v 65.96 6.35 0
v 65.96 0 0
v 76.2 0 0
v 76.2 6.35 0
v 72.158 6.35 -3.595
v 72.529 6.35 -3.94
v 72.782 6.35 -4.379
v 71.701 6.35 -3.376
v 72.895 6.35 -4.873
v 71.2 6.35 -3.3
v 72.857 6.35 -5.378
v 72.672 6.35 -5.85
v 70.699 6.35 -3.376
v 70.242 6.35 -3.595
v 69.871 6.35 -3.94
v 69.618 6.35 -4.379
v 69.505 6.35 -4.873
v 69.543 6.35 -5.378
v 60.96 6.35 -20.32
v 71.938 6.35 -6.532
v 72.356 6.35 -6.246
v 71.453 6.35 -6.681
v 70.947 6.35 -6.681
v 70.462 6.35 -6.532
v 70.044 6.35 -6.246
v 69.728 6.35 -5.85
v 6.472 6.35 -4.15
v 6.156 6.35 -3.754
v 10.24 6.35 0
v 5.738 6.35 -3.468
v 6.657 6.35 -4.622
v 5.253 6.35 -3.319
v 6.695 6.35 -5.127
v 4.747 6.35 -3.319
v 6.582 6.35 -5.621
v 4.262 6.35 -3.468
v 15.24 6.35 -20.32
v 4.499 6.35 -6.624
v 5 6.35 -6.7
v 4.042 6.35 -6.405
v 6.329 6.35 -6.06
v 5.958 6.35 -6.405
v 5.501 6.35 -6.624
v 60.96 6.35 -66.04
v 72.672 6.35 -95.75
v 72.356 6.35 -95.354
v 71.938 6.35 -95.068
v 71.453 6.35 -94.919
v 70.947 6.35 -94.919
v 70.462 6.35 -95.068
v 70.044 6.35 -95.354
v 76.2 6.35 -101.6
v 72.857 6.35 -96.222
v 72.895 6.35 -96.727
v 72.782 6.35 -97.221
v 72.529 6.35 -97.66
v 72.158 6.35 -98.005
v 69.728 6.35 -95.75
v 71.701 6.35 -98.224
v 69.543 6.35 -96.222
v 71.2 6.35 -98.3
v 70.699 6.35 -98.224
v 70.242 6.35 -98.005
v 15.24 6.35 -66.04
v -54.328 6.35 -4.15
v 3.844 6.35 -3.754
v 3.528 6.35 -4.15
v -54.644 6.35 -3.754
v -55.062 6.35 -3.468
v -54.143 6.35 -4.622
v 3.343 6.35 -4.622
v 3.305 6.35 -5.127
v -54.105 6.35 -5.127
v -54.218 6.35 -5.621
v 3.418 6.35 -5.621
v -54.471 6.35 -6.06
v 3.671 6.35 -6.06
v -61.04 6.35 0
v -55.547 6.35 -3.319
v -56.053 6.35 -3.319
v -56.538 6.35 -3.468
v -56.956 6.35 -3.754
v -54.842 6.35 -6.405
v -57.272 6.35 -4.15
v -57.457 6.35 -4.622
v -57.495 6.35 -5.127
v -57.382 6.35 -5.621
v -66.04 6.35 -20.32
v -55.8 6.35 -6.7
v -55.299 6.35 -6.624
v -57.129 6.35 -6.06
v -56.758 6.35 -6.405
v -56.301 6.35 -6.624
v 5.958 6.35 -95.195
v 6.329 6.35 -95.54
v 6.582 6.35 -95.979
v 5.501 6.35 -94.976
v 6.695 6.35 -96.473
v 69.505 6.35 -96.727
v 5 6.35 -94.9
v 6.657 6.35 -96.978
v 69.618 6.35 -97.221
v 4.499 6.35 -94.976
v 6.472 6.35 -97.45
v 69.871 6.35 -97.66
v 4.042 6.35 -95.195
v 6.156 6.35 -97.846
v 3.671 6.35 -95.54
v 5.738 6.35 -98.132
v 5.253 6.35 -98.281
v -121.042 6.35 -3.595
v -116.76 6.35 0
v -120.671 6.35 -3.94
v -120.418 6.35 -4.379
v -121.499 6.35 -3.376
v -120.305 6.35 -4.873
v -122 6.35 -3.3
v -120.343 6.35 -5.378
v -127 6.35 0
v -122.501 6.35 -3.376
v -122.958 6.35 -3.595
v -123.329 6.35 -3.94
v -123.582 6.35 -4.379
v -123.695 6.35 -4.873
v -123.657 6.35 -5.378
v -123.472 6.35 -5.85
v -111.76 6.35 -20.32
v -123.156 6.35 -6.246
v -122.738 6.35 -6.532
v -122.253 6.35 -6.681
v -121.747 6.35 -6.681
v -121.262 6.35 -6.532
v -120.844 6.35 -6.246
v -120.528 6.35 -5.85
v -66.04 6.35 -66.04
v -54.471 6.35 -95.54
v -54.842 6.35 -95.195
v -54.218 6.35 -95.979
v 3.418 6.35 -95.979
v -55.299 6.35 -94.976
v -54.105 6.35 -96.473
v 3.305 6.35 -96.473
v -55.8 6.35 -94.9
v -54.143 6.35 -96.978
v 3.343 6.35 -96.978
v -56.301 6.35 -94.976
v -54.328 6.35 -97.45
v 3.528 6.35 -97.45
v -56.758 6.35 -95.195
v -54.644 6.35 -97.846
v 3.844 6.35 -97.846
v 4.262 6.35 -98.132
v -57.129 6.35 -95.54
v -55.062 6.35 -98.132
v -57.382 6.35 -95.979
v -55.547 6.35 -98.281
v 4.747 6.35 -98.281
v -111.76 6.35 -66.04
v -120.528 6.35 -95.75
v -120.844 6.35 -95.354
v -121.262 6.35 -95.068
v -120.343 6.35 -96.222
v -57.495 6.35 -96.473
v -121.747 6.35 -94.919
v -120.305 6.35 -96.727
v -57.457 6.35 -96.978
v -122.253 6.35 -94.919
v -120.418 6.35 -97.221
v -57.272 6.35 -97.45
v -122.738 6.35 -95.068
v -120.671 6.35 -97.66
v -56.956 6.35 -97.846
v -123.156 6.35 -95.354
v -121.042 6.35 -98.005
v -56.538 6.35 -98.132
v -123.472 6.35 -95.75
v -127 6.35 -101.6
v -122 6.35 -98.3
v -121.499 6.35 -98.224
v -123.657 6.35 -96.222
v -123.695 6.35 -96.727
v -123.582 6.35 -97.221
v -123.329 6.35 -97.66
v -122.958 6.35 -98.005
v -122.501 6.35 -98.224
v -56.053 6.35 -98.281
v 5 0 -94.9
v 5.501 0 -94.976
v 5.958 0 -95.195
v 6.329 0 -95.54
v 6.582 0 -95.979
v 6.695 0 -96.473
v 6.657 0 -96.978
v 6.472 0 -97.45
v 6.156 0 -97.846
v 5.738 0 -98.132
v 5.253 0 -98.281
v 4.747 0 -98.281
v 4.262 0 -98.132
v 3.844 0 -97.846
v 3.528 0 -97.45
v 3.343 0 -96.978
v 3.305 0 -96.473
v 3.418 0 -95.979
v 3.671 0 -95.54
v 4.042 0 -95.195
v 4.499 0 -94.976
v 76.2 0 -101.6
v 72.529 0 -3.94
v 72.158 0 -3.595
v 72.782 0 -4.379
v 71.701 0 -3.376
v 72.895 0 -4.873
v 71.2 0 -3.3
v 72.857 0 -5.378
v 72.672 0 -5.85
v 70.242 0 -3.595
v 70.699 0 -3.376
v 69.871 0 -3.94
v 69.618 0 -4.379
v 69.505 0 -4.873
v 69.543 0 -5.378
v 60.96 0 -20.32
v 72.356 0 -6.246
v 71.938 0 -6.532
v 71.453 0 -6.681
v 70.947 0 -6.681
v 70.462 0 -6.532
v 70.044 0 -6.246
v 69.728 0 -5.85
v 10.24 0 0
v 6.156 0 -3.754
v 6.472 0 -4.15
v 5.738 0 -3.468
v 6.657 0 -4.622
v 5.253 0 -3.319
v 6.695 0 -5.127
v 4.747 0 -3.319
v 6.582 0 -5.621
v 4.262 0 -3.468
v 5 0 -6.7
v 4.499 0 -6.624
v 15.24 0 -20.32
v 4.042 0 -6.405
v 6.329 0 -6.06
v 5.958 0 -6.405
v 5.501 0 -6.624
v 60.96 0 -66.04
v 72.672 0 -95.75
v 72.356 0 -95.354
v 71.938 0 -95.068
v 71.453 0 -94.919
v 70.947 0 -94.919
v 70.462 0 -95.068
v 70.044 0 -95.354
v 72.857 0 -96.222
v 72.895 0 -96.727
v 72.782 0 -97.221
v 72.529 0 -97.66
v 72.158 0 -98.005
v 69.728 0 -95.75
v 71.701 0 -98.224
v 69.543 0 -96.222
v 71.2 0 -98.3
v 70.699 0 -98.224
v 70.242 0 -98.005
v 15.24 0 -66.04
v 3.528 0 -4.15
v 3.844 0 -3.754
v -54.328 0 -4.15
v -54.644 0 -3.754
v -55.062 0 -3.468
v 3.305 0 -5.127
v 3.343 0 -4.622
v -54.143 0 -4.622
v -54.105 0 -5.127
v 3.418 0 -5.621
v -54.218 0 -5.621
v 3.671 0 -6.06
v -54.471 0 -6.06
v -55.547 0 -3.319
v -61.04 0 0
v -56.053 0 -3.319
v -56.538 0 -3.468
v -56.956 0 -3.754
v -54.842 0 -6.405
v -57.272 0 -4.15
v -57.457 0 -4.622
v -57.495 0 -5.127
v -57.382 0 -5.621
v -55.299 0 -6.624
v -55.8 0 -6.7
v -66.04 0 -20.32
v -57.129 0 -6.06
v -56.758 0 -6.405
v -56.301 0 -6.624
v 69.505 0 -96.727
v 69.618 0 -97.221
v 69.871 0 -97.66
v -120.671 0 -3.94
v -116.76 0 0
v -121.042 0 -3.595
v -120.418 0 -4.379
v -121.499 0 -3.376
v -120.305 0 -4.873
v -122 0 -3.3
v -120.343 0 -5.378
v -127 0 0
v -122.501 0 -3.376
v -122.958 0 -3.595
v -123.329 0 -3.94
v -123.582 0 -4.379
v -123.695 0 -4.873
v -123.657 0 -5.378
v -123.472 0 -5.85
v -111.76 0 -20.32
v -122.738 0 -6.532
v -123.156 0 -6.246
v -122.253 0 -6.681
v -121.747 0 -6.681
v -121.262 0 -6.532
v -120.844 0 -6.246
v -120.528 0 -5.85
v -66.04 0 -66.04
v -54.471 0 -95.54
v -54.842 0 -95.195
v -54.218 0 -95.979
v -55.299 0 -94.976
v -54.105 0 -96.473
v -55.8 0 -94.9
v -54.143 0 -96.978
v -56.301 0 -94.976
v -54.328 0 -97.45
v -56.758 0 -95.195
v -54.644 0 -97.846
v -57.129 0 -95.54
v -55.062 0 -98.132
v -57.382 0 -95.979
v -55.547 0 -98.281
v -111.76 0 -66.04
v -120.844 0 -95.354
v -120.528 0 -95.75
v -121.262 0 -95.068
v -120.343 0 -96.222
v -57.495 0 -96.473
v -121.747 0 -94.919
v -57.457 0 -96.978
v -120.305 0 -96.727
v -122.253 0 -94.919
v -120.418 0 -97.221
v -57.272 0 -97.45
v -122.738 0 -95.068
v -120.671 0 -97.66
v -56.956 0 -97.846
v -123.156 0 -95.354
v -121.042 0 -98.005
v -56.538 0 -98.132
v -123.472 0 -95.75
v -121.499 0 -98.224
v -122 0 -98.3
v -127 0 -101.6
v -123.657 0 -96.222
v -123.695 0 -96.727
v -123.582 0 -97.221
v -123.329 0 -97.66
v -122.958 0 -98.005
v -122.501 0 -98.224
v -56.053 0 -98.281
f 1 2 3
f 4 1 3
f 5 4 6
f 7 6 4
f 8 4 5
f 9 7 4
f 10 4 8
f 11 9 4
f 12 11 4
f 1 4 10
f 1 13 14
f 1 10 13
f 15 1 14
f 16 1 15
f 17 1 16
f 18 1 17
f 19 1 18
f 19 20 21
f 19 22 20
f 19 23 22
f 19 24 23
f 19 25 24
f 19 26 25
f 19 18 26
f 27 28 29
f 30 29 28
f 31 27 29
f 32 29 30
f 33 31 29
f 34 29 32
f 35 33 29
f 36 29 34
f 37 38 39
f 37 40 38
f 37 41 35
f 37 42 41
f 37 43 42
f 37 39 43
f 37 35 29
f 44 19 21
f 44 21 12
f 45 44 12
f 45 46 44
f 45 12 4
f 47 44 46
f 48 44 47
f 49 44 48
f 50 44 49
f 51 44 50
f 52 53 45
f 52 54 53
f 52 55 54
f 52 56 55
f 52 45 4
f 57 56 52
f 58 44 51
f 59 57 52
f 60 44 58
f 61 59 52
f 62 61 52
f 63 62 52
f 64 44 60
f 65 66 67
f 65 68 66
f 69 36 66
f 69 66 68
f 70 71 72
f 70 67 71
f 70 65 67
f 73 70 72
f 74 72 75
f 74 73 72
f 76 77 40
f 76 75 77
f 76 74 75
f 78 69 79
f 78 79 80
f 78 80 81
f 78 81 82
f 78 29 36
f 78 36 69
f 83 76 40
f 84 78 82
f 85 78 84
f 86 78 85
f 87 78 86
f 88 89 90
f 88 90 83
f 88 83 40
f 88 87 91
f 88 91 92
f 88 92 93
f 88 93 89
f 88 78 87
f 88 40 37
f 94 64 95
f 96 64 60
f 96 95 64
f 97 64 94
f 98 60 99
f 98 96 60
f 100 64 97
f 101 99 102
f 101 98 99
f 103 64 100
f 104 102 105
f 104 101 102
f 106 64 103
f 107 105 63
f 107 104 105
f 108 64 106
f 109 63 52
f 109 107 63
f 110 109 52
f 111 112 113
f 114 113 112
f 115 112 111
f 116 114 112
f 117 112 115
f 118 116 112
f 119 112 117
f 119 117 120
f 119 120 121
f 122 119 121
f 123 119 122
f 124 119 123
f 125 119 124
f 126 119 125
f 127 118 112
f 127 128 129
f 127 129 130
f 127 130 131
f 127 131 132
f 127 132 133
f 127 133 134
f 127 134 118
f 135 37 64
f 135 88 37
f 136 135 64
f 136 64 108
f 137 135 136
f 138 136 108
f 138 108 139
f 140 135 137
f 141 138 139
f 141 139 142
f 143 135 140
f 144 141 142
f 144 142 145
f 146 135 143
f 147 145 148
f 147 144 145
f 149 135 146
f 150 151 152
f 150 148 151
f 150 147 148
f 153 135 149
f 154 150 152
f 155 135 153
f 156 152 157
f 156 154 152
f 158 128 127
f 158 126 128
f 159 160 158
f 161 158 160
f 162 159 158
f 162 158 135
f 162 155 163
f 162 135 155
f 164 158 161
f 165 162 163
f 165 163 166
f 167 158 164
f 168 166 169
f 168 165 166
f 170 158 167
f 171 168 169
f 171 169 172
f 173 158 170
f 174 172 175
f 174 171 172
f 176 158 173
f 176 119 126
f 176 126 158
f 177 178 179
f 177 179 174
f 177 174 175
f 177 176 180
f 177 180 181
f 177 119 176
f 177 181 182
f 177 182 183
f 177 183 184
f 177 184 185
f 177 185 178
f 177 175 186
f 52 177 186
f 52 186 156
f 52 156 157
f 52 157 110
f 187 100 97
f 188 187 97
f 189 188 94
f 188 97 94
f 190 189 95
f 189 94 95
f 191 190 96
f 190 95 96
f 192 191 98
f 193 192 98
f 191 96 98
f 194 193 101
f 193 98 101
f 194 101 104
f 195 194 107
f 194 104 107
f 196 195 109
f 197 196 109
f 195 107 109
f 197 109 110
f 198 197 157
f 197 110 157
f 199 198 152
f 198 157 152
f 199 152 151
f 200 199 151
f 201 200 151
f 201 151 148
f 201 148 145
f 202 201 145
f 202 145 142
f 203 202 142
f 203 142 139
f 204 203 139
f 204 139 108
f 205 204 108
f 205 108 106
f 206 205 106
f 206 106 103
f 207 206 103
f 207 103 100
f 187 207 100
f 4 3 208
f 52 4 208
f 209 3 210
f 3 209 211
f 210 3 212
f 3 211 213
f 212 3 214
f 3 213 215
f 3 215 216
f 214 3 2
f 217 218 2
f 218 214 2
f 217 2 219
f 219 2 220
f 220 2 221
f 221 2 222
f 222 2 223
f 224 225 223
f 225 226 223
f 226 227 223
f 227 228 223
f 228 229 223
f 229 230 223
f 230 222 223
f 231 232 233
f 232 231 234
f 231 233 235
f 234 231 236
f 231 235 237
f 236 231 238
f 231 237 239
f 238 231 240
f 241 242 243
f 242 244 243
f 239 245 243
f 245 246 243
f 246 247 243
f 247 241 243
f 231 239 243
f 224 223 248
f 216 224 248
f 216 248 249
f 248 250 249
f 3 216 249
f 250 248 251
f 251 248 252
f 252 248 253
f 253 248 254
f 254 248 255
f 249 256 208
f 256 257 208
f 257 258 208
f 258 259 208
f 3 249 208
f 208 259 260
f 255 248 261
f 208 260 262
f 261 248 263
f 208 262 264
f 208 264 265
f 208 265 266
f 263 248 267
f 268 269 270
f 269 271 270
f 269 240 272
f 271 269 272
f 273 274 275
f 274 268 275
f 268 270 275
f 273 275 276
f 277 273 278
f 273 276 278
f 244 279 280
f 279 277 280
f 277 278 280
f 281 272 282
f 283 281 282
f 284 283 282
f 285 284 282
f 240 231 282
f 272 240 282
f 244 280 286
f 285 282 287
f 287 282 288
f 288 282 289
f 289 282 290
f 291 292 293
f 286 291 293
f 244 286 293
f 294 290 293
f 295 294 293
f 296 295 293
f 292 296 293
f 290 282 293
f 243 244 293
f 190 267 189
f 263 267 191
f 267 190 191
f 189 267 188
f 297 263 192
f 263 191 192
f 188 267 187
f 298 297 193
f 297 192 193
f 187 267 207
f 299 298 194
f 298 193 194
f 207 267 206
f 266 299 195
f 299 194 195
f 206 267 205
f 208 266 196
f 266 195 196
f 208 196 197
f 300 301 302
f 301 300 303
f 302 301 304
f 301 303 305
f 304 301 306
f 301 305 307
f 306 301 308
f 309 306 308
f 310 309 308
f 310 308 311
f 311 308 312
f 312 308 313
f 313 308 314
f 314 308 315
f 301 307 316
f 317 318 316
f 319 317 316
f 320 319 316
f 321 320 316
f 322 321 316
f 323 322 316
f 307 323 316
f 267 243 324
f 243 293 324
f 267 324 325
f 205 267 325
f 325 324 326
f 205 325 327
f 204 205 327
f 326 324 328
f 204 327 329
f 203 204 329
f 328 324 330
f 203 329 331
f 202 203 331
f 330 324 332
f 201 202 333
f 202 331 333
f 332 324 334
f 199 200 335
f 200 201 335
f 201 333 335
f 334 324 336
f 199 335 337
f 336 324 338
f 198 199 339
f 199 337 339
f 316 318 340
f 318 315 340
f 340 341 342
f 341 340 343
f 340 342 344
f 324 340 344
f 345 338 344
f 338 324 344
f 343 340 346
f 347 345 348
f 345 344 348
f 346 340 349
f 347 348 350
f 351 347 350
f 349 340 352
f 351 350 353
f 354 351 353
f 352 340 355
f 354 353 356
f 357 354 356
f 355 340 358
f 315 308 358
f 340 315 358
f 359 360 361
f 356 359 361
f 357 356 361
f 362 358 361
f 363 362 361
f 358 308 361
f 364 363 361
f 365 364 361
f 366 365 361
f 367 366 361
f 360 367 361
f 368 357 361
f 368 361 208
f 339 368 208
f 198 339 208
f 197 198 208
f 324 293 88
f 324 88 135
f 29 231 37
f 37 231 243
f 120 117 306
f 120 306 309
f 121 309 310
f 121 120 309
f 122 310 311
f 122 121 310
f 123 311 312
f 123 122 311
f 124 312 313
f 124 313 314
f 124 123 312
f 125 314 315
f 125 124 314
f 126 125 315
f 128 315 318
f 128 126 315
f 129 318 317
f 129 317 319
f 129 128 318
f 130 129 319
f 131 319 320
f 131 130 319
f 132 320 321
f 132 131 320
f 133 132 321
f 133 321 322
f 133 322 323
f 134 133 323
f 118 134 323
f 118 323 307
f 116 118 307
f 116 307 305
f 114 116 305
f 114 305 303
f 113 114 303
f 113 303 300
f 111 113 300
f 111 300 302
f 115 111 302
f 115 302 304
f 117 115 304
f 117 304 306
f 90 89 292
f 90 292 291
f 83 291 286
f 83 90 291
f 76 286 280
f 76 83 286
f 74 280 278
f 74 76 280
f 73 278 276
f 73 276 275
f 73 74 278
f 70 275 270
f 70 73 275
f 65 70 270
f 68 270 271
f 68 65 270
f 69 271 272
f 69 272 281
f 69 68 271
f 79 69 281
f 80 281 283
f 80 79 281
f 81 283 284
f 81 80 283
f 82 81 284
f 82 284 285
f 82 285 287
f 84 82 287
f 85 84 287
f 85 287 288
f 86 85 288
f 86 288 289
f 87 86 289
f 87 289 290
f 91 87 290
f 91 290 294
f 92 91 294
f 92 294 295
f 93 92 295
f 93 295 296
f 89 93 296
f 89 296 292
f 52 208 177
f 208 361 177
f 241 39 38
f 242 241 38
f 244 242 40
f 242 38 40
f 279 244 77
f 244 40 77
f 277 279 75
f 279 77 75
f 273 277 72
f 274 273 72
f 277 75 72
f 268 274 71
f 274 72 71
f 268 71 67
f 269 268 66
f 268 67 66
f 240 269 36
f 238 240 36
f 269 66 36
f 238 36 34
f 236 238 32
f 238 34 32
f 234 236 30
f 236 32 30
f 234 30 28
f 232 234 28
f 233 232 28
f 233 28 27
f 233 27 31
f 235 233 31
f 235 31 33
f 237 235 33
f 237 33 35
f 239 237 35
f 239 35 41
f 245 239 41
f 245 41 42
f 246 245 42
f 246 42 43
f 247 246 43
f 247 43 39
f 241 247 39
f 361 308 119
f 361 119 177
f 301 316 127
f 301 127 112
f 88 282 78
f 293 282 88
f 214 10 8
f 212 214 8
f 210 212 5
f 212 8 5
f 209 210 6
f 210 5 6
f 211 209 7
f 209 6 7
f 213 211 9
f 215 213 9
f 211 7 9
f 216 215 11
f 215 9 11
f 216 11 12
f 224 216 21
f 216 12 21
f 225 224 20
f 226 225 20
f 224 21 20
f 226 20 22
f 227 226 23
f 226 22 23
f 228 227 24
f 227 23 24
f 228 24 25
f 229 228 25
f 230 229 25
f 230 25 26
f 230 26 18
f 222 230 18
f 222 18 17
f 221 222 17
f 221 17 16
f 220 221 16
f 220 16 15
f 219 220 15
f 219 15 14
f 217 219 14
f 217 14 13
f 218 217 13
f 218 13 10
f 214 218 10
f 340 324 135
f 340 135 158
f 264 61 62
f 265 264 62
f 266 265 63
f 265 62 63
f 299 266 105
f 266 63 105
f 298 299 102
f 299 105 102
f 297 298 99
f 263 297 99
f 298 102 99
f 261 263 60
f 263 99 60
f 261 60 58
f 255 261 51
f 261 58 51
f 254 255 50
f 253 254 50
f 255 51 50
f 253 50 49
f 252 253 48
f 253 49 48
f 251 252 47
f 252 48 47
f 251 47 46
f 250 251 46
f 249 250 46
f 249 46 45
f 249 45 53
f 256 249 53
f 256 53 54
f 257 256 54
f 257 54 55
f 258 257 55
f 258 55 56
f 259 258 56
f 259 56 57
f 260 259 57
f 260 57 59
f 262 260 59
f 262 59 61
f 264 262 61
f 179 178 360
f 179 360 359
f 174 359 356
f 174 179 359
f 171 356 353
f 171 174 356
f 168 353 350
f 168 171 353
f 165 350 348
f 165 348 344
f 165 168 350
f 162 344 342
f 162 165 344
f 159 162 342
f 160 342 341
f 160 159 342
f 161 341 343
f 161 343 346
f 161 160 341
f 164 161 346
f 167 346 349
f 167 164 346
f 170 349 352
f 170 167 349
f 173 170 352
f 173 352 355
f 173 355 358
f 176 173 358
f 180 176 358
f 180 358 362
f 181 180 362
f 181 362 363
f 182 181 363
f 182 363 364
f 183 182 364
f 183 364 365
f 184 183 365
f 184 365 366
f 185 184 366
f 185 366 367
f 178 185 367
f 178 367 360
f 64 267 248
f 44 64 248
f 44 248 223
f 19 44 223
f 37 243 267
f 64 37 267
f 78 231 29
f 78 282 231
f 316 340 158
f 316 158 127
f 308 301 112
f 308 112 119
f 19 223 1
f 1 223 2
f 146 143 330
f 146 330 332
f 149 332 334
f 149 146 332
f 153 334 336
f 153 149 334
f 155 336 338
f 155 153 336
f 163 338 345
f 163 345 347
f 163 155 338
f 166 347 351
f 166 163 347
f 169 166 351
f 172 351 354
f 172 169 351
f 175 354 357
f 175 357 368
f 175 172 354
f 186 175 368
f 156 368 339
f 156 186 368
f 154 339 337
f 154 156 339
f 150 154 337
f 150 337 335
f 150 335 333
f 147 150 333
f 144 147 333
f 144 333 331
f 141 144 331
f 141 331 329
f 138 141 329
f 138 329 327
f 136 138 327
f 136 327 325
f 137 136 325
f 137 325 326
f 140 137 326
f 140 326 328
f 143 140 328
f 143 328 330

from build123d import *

# Parameters (mm, degrees)
BOSS_EXTRUDE1_DEPTH = 6.35
SKETCH2_R           = 1.7
CUT_EXTRUDE1_DEPTH  = 128.158650905
SKETCH3_W           = 101.6
SKETCH3_H           = 6.35
BOSS_EXTRUDE2_DEPTH = 50.8


with BuildPart() as part:
    # Sketch1 → Boss-Extrude1 (new body)
    with BuildSketch(Plane(origin=(0, 0, 0), x_dir=(1, 0, 0), z_dir=(0, 1, 0))):
        Polygon((15.24, 20.32), (15.24, 66.04), (60.96, 66.04), (60.96, 20.32), (65.96, 0), (76.2, 0), (76.2, 101.6), (0, 101.6), (0, 0), (10.24, 0), align=None)
    extrude(amount=BOSS_EXTRUDE1_DEPTH)

    # Sketch2 → Cut-Extrude1 (cut, through all)
    with BuildSketch(Plane(origin=(0, 6.35, 0), x_dir=(1, 0, 0), z_dir=(0, 1, 0))):
        with Locations(Location((5, 96.6, 0), (0, 0, 270))):
            Circle(SKETCH2_R)
        with Locations(Location((71.2, 96.6, 0), (0, 0, 90))):
            Circle(SKETCH2_R)
        with Locations(Location((71.2, 5, 0), (0, 0, 270))):
            Circle(SKETCH2_R)
        with Locations(Location((5, 5, 0), (0, 0, 90))):
            Circle(SKETCH2_R)
    extrude(amount=-CUT_EXTRUDE1_DEPTH, mode=Mode.SUBTRACT)


with BuildPart() as body_2:
    # Mirror1: mirrored copy
    add(part.part.mirror(Plane.ZY.offset(25.4)))


with BuildPart() as part_1:
    add(part.part)

    add(body_2.part)  # Boss-Extrude2 merges body 2
    # Sketch3 → Boss-Extrude2 (add)
    with BuildSketch(Plane(origin=(-50.8, 0, 0), x_dir=(0, 0, -1), z_dir=(1, 0, 0))):
        with Locations((50.8, 3.175)):
            Rectangle(SKETCH3_W, SKETCH3_H)
    extrude(amount=BOSS_EXTRUDE2_DEPTH)


solid = part_1.part
